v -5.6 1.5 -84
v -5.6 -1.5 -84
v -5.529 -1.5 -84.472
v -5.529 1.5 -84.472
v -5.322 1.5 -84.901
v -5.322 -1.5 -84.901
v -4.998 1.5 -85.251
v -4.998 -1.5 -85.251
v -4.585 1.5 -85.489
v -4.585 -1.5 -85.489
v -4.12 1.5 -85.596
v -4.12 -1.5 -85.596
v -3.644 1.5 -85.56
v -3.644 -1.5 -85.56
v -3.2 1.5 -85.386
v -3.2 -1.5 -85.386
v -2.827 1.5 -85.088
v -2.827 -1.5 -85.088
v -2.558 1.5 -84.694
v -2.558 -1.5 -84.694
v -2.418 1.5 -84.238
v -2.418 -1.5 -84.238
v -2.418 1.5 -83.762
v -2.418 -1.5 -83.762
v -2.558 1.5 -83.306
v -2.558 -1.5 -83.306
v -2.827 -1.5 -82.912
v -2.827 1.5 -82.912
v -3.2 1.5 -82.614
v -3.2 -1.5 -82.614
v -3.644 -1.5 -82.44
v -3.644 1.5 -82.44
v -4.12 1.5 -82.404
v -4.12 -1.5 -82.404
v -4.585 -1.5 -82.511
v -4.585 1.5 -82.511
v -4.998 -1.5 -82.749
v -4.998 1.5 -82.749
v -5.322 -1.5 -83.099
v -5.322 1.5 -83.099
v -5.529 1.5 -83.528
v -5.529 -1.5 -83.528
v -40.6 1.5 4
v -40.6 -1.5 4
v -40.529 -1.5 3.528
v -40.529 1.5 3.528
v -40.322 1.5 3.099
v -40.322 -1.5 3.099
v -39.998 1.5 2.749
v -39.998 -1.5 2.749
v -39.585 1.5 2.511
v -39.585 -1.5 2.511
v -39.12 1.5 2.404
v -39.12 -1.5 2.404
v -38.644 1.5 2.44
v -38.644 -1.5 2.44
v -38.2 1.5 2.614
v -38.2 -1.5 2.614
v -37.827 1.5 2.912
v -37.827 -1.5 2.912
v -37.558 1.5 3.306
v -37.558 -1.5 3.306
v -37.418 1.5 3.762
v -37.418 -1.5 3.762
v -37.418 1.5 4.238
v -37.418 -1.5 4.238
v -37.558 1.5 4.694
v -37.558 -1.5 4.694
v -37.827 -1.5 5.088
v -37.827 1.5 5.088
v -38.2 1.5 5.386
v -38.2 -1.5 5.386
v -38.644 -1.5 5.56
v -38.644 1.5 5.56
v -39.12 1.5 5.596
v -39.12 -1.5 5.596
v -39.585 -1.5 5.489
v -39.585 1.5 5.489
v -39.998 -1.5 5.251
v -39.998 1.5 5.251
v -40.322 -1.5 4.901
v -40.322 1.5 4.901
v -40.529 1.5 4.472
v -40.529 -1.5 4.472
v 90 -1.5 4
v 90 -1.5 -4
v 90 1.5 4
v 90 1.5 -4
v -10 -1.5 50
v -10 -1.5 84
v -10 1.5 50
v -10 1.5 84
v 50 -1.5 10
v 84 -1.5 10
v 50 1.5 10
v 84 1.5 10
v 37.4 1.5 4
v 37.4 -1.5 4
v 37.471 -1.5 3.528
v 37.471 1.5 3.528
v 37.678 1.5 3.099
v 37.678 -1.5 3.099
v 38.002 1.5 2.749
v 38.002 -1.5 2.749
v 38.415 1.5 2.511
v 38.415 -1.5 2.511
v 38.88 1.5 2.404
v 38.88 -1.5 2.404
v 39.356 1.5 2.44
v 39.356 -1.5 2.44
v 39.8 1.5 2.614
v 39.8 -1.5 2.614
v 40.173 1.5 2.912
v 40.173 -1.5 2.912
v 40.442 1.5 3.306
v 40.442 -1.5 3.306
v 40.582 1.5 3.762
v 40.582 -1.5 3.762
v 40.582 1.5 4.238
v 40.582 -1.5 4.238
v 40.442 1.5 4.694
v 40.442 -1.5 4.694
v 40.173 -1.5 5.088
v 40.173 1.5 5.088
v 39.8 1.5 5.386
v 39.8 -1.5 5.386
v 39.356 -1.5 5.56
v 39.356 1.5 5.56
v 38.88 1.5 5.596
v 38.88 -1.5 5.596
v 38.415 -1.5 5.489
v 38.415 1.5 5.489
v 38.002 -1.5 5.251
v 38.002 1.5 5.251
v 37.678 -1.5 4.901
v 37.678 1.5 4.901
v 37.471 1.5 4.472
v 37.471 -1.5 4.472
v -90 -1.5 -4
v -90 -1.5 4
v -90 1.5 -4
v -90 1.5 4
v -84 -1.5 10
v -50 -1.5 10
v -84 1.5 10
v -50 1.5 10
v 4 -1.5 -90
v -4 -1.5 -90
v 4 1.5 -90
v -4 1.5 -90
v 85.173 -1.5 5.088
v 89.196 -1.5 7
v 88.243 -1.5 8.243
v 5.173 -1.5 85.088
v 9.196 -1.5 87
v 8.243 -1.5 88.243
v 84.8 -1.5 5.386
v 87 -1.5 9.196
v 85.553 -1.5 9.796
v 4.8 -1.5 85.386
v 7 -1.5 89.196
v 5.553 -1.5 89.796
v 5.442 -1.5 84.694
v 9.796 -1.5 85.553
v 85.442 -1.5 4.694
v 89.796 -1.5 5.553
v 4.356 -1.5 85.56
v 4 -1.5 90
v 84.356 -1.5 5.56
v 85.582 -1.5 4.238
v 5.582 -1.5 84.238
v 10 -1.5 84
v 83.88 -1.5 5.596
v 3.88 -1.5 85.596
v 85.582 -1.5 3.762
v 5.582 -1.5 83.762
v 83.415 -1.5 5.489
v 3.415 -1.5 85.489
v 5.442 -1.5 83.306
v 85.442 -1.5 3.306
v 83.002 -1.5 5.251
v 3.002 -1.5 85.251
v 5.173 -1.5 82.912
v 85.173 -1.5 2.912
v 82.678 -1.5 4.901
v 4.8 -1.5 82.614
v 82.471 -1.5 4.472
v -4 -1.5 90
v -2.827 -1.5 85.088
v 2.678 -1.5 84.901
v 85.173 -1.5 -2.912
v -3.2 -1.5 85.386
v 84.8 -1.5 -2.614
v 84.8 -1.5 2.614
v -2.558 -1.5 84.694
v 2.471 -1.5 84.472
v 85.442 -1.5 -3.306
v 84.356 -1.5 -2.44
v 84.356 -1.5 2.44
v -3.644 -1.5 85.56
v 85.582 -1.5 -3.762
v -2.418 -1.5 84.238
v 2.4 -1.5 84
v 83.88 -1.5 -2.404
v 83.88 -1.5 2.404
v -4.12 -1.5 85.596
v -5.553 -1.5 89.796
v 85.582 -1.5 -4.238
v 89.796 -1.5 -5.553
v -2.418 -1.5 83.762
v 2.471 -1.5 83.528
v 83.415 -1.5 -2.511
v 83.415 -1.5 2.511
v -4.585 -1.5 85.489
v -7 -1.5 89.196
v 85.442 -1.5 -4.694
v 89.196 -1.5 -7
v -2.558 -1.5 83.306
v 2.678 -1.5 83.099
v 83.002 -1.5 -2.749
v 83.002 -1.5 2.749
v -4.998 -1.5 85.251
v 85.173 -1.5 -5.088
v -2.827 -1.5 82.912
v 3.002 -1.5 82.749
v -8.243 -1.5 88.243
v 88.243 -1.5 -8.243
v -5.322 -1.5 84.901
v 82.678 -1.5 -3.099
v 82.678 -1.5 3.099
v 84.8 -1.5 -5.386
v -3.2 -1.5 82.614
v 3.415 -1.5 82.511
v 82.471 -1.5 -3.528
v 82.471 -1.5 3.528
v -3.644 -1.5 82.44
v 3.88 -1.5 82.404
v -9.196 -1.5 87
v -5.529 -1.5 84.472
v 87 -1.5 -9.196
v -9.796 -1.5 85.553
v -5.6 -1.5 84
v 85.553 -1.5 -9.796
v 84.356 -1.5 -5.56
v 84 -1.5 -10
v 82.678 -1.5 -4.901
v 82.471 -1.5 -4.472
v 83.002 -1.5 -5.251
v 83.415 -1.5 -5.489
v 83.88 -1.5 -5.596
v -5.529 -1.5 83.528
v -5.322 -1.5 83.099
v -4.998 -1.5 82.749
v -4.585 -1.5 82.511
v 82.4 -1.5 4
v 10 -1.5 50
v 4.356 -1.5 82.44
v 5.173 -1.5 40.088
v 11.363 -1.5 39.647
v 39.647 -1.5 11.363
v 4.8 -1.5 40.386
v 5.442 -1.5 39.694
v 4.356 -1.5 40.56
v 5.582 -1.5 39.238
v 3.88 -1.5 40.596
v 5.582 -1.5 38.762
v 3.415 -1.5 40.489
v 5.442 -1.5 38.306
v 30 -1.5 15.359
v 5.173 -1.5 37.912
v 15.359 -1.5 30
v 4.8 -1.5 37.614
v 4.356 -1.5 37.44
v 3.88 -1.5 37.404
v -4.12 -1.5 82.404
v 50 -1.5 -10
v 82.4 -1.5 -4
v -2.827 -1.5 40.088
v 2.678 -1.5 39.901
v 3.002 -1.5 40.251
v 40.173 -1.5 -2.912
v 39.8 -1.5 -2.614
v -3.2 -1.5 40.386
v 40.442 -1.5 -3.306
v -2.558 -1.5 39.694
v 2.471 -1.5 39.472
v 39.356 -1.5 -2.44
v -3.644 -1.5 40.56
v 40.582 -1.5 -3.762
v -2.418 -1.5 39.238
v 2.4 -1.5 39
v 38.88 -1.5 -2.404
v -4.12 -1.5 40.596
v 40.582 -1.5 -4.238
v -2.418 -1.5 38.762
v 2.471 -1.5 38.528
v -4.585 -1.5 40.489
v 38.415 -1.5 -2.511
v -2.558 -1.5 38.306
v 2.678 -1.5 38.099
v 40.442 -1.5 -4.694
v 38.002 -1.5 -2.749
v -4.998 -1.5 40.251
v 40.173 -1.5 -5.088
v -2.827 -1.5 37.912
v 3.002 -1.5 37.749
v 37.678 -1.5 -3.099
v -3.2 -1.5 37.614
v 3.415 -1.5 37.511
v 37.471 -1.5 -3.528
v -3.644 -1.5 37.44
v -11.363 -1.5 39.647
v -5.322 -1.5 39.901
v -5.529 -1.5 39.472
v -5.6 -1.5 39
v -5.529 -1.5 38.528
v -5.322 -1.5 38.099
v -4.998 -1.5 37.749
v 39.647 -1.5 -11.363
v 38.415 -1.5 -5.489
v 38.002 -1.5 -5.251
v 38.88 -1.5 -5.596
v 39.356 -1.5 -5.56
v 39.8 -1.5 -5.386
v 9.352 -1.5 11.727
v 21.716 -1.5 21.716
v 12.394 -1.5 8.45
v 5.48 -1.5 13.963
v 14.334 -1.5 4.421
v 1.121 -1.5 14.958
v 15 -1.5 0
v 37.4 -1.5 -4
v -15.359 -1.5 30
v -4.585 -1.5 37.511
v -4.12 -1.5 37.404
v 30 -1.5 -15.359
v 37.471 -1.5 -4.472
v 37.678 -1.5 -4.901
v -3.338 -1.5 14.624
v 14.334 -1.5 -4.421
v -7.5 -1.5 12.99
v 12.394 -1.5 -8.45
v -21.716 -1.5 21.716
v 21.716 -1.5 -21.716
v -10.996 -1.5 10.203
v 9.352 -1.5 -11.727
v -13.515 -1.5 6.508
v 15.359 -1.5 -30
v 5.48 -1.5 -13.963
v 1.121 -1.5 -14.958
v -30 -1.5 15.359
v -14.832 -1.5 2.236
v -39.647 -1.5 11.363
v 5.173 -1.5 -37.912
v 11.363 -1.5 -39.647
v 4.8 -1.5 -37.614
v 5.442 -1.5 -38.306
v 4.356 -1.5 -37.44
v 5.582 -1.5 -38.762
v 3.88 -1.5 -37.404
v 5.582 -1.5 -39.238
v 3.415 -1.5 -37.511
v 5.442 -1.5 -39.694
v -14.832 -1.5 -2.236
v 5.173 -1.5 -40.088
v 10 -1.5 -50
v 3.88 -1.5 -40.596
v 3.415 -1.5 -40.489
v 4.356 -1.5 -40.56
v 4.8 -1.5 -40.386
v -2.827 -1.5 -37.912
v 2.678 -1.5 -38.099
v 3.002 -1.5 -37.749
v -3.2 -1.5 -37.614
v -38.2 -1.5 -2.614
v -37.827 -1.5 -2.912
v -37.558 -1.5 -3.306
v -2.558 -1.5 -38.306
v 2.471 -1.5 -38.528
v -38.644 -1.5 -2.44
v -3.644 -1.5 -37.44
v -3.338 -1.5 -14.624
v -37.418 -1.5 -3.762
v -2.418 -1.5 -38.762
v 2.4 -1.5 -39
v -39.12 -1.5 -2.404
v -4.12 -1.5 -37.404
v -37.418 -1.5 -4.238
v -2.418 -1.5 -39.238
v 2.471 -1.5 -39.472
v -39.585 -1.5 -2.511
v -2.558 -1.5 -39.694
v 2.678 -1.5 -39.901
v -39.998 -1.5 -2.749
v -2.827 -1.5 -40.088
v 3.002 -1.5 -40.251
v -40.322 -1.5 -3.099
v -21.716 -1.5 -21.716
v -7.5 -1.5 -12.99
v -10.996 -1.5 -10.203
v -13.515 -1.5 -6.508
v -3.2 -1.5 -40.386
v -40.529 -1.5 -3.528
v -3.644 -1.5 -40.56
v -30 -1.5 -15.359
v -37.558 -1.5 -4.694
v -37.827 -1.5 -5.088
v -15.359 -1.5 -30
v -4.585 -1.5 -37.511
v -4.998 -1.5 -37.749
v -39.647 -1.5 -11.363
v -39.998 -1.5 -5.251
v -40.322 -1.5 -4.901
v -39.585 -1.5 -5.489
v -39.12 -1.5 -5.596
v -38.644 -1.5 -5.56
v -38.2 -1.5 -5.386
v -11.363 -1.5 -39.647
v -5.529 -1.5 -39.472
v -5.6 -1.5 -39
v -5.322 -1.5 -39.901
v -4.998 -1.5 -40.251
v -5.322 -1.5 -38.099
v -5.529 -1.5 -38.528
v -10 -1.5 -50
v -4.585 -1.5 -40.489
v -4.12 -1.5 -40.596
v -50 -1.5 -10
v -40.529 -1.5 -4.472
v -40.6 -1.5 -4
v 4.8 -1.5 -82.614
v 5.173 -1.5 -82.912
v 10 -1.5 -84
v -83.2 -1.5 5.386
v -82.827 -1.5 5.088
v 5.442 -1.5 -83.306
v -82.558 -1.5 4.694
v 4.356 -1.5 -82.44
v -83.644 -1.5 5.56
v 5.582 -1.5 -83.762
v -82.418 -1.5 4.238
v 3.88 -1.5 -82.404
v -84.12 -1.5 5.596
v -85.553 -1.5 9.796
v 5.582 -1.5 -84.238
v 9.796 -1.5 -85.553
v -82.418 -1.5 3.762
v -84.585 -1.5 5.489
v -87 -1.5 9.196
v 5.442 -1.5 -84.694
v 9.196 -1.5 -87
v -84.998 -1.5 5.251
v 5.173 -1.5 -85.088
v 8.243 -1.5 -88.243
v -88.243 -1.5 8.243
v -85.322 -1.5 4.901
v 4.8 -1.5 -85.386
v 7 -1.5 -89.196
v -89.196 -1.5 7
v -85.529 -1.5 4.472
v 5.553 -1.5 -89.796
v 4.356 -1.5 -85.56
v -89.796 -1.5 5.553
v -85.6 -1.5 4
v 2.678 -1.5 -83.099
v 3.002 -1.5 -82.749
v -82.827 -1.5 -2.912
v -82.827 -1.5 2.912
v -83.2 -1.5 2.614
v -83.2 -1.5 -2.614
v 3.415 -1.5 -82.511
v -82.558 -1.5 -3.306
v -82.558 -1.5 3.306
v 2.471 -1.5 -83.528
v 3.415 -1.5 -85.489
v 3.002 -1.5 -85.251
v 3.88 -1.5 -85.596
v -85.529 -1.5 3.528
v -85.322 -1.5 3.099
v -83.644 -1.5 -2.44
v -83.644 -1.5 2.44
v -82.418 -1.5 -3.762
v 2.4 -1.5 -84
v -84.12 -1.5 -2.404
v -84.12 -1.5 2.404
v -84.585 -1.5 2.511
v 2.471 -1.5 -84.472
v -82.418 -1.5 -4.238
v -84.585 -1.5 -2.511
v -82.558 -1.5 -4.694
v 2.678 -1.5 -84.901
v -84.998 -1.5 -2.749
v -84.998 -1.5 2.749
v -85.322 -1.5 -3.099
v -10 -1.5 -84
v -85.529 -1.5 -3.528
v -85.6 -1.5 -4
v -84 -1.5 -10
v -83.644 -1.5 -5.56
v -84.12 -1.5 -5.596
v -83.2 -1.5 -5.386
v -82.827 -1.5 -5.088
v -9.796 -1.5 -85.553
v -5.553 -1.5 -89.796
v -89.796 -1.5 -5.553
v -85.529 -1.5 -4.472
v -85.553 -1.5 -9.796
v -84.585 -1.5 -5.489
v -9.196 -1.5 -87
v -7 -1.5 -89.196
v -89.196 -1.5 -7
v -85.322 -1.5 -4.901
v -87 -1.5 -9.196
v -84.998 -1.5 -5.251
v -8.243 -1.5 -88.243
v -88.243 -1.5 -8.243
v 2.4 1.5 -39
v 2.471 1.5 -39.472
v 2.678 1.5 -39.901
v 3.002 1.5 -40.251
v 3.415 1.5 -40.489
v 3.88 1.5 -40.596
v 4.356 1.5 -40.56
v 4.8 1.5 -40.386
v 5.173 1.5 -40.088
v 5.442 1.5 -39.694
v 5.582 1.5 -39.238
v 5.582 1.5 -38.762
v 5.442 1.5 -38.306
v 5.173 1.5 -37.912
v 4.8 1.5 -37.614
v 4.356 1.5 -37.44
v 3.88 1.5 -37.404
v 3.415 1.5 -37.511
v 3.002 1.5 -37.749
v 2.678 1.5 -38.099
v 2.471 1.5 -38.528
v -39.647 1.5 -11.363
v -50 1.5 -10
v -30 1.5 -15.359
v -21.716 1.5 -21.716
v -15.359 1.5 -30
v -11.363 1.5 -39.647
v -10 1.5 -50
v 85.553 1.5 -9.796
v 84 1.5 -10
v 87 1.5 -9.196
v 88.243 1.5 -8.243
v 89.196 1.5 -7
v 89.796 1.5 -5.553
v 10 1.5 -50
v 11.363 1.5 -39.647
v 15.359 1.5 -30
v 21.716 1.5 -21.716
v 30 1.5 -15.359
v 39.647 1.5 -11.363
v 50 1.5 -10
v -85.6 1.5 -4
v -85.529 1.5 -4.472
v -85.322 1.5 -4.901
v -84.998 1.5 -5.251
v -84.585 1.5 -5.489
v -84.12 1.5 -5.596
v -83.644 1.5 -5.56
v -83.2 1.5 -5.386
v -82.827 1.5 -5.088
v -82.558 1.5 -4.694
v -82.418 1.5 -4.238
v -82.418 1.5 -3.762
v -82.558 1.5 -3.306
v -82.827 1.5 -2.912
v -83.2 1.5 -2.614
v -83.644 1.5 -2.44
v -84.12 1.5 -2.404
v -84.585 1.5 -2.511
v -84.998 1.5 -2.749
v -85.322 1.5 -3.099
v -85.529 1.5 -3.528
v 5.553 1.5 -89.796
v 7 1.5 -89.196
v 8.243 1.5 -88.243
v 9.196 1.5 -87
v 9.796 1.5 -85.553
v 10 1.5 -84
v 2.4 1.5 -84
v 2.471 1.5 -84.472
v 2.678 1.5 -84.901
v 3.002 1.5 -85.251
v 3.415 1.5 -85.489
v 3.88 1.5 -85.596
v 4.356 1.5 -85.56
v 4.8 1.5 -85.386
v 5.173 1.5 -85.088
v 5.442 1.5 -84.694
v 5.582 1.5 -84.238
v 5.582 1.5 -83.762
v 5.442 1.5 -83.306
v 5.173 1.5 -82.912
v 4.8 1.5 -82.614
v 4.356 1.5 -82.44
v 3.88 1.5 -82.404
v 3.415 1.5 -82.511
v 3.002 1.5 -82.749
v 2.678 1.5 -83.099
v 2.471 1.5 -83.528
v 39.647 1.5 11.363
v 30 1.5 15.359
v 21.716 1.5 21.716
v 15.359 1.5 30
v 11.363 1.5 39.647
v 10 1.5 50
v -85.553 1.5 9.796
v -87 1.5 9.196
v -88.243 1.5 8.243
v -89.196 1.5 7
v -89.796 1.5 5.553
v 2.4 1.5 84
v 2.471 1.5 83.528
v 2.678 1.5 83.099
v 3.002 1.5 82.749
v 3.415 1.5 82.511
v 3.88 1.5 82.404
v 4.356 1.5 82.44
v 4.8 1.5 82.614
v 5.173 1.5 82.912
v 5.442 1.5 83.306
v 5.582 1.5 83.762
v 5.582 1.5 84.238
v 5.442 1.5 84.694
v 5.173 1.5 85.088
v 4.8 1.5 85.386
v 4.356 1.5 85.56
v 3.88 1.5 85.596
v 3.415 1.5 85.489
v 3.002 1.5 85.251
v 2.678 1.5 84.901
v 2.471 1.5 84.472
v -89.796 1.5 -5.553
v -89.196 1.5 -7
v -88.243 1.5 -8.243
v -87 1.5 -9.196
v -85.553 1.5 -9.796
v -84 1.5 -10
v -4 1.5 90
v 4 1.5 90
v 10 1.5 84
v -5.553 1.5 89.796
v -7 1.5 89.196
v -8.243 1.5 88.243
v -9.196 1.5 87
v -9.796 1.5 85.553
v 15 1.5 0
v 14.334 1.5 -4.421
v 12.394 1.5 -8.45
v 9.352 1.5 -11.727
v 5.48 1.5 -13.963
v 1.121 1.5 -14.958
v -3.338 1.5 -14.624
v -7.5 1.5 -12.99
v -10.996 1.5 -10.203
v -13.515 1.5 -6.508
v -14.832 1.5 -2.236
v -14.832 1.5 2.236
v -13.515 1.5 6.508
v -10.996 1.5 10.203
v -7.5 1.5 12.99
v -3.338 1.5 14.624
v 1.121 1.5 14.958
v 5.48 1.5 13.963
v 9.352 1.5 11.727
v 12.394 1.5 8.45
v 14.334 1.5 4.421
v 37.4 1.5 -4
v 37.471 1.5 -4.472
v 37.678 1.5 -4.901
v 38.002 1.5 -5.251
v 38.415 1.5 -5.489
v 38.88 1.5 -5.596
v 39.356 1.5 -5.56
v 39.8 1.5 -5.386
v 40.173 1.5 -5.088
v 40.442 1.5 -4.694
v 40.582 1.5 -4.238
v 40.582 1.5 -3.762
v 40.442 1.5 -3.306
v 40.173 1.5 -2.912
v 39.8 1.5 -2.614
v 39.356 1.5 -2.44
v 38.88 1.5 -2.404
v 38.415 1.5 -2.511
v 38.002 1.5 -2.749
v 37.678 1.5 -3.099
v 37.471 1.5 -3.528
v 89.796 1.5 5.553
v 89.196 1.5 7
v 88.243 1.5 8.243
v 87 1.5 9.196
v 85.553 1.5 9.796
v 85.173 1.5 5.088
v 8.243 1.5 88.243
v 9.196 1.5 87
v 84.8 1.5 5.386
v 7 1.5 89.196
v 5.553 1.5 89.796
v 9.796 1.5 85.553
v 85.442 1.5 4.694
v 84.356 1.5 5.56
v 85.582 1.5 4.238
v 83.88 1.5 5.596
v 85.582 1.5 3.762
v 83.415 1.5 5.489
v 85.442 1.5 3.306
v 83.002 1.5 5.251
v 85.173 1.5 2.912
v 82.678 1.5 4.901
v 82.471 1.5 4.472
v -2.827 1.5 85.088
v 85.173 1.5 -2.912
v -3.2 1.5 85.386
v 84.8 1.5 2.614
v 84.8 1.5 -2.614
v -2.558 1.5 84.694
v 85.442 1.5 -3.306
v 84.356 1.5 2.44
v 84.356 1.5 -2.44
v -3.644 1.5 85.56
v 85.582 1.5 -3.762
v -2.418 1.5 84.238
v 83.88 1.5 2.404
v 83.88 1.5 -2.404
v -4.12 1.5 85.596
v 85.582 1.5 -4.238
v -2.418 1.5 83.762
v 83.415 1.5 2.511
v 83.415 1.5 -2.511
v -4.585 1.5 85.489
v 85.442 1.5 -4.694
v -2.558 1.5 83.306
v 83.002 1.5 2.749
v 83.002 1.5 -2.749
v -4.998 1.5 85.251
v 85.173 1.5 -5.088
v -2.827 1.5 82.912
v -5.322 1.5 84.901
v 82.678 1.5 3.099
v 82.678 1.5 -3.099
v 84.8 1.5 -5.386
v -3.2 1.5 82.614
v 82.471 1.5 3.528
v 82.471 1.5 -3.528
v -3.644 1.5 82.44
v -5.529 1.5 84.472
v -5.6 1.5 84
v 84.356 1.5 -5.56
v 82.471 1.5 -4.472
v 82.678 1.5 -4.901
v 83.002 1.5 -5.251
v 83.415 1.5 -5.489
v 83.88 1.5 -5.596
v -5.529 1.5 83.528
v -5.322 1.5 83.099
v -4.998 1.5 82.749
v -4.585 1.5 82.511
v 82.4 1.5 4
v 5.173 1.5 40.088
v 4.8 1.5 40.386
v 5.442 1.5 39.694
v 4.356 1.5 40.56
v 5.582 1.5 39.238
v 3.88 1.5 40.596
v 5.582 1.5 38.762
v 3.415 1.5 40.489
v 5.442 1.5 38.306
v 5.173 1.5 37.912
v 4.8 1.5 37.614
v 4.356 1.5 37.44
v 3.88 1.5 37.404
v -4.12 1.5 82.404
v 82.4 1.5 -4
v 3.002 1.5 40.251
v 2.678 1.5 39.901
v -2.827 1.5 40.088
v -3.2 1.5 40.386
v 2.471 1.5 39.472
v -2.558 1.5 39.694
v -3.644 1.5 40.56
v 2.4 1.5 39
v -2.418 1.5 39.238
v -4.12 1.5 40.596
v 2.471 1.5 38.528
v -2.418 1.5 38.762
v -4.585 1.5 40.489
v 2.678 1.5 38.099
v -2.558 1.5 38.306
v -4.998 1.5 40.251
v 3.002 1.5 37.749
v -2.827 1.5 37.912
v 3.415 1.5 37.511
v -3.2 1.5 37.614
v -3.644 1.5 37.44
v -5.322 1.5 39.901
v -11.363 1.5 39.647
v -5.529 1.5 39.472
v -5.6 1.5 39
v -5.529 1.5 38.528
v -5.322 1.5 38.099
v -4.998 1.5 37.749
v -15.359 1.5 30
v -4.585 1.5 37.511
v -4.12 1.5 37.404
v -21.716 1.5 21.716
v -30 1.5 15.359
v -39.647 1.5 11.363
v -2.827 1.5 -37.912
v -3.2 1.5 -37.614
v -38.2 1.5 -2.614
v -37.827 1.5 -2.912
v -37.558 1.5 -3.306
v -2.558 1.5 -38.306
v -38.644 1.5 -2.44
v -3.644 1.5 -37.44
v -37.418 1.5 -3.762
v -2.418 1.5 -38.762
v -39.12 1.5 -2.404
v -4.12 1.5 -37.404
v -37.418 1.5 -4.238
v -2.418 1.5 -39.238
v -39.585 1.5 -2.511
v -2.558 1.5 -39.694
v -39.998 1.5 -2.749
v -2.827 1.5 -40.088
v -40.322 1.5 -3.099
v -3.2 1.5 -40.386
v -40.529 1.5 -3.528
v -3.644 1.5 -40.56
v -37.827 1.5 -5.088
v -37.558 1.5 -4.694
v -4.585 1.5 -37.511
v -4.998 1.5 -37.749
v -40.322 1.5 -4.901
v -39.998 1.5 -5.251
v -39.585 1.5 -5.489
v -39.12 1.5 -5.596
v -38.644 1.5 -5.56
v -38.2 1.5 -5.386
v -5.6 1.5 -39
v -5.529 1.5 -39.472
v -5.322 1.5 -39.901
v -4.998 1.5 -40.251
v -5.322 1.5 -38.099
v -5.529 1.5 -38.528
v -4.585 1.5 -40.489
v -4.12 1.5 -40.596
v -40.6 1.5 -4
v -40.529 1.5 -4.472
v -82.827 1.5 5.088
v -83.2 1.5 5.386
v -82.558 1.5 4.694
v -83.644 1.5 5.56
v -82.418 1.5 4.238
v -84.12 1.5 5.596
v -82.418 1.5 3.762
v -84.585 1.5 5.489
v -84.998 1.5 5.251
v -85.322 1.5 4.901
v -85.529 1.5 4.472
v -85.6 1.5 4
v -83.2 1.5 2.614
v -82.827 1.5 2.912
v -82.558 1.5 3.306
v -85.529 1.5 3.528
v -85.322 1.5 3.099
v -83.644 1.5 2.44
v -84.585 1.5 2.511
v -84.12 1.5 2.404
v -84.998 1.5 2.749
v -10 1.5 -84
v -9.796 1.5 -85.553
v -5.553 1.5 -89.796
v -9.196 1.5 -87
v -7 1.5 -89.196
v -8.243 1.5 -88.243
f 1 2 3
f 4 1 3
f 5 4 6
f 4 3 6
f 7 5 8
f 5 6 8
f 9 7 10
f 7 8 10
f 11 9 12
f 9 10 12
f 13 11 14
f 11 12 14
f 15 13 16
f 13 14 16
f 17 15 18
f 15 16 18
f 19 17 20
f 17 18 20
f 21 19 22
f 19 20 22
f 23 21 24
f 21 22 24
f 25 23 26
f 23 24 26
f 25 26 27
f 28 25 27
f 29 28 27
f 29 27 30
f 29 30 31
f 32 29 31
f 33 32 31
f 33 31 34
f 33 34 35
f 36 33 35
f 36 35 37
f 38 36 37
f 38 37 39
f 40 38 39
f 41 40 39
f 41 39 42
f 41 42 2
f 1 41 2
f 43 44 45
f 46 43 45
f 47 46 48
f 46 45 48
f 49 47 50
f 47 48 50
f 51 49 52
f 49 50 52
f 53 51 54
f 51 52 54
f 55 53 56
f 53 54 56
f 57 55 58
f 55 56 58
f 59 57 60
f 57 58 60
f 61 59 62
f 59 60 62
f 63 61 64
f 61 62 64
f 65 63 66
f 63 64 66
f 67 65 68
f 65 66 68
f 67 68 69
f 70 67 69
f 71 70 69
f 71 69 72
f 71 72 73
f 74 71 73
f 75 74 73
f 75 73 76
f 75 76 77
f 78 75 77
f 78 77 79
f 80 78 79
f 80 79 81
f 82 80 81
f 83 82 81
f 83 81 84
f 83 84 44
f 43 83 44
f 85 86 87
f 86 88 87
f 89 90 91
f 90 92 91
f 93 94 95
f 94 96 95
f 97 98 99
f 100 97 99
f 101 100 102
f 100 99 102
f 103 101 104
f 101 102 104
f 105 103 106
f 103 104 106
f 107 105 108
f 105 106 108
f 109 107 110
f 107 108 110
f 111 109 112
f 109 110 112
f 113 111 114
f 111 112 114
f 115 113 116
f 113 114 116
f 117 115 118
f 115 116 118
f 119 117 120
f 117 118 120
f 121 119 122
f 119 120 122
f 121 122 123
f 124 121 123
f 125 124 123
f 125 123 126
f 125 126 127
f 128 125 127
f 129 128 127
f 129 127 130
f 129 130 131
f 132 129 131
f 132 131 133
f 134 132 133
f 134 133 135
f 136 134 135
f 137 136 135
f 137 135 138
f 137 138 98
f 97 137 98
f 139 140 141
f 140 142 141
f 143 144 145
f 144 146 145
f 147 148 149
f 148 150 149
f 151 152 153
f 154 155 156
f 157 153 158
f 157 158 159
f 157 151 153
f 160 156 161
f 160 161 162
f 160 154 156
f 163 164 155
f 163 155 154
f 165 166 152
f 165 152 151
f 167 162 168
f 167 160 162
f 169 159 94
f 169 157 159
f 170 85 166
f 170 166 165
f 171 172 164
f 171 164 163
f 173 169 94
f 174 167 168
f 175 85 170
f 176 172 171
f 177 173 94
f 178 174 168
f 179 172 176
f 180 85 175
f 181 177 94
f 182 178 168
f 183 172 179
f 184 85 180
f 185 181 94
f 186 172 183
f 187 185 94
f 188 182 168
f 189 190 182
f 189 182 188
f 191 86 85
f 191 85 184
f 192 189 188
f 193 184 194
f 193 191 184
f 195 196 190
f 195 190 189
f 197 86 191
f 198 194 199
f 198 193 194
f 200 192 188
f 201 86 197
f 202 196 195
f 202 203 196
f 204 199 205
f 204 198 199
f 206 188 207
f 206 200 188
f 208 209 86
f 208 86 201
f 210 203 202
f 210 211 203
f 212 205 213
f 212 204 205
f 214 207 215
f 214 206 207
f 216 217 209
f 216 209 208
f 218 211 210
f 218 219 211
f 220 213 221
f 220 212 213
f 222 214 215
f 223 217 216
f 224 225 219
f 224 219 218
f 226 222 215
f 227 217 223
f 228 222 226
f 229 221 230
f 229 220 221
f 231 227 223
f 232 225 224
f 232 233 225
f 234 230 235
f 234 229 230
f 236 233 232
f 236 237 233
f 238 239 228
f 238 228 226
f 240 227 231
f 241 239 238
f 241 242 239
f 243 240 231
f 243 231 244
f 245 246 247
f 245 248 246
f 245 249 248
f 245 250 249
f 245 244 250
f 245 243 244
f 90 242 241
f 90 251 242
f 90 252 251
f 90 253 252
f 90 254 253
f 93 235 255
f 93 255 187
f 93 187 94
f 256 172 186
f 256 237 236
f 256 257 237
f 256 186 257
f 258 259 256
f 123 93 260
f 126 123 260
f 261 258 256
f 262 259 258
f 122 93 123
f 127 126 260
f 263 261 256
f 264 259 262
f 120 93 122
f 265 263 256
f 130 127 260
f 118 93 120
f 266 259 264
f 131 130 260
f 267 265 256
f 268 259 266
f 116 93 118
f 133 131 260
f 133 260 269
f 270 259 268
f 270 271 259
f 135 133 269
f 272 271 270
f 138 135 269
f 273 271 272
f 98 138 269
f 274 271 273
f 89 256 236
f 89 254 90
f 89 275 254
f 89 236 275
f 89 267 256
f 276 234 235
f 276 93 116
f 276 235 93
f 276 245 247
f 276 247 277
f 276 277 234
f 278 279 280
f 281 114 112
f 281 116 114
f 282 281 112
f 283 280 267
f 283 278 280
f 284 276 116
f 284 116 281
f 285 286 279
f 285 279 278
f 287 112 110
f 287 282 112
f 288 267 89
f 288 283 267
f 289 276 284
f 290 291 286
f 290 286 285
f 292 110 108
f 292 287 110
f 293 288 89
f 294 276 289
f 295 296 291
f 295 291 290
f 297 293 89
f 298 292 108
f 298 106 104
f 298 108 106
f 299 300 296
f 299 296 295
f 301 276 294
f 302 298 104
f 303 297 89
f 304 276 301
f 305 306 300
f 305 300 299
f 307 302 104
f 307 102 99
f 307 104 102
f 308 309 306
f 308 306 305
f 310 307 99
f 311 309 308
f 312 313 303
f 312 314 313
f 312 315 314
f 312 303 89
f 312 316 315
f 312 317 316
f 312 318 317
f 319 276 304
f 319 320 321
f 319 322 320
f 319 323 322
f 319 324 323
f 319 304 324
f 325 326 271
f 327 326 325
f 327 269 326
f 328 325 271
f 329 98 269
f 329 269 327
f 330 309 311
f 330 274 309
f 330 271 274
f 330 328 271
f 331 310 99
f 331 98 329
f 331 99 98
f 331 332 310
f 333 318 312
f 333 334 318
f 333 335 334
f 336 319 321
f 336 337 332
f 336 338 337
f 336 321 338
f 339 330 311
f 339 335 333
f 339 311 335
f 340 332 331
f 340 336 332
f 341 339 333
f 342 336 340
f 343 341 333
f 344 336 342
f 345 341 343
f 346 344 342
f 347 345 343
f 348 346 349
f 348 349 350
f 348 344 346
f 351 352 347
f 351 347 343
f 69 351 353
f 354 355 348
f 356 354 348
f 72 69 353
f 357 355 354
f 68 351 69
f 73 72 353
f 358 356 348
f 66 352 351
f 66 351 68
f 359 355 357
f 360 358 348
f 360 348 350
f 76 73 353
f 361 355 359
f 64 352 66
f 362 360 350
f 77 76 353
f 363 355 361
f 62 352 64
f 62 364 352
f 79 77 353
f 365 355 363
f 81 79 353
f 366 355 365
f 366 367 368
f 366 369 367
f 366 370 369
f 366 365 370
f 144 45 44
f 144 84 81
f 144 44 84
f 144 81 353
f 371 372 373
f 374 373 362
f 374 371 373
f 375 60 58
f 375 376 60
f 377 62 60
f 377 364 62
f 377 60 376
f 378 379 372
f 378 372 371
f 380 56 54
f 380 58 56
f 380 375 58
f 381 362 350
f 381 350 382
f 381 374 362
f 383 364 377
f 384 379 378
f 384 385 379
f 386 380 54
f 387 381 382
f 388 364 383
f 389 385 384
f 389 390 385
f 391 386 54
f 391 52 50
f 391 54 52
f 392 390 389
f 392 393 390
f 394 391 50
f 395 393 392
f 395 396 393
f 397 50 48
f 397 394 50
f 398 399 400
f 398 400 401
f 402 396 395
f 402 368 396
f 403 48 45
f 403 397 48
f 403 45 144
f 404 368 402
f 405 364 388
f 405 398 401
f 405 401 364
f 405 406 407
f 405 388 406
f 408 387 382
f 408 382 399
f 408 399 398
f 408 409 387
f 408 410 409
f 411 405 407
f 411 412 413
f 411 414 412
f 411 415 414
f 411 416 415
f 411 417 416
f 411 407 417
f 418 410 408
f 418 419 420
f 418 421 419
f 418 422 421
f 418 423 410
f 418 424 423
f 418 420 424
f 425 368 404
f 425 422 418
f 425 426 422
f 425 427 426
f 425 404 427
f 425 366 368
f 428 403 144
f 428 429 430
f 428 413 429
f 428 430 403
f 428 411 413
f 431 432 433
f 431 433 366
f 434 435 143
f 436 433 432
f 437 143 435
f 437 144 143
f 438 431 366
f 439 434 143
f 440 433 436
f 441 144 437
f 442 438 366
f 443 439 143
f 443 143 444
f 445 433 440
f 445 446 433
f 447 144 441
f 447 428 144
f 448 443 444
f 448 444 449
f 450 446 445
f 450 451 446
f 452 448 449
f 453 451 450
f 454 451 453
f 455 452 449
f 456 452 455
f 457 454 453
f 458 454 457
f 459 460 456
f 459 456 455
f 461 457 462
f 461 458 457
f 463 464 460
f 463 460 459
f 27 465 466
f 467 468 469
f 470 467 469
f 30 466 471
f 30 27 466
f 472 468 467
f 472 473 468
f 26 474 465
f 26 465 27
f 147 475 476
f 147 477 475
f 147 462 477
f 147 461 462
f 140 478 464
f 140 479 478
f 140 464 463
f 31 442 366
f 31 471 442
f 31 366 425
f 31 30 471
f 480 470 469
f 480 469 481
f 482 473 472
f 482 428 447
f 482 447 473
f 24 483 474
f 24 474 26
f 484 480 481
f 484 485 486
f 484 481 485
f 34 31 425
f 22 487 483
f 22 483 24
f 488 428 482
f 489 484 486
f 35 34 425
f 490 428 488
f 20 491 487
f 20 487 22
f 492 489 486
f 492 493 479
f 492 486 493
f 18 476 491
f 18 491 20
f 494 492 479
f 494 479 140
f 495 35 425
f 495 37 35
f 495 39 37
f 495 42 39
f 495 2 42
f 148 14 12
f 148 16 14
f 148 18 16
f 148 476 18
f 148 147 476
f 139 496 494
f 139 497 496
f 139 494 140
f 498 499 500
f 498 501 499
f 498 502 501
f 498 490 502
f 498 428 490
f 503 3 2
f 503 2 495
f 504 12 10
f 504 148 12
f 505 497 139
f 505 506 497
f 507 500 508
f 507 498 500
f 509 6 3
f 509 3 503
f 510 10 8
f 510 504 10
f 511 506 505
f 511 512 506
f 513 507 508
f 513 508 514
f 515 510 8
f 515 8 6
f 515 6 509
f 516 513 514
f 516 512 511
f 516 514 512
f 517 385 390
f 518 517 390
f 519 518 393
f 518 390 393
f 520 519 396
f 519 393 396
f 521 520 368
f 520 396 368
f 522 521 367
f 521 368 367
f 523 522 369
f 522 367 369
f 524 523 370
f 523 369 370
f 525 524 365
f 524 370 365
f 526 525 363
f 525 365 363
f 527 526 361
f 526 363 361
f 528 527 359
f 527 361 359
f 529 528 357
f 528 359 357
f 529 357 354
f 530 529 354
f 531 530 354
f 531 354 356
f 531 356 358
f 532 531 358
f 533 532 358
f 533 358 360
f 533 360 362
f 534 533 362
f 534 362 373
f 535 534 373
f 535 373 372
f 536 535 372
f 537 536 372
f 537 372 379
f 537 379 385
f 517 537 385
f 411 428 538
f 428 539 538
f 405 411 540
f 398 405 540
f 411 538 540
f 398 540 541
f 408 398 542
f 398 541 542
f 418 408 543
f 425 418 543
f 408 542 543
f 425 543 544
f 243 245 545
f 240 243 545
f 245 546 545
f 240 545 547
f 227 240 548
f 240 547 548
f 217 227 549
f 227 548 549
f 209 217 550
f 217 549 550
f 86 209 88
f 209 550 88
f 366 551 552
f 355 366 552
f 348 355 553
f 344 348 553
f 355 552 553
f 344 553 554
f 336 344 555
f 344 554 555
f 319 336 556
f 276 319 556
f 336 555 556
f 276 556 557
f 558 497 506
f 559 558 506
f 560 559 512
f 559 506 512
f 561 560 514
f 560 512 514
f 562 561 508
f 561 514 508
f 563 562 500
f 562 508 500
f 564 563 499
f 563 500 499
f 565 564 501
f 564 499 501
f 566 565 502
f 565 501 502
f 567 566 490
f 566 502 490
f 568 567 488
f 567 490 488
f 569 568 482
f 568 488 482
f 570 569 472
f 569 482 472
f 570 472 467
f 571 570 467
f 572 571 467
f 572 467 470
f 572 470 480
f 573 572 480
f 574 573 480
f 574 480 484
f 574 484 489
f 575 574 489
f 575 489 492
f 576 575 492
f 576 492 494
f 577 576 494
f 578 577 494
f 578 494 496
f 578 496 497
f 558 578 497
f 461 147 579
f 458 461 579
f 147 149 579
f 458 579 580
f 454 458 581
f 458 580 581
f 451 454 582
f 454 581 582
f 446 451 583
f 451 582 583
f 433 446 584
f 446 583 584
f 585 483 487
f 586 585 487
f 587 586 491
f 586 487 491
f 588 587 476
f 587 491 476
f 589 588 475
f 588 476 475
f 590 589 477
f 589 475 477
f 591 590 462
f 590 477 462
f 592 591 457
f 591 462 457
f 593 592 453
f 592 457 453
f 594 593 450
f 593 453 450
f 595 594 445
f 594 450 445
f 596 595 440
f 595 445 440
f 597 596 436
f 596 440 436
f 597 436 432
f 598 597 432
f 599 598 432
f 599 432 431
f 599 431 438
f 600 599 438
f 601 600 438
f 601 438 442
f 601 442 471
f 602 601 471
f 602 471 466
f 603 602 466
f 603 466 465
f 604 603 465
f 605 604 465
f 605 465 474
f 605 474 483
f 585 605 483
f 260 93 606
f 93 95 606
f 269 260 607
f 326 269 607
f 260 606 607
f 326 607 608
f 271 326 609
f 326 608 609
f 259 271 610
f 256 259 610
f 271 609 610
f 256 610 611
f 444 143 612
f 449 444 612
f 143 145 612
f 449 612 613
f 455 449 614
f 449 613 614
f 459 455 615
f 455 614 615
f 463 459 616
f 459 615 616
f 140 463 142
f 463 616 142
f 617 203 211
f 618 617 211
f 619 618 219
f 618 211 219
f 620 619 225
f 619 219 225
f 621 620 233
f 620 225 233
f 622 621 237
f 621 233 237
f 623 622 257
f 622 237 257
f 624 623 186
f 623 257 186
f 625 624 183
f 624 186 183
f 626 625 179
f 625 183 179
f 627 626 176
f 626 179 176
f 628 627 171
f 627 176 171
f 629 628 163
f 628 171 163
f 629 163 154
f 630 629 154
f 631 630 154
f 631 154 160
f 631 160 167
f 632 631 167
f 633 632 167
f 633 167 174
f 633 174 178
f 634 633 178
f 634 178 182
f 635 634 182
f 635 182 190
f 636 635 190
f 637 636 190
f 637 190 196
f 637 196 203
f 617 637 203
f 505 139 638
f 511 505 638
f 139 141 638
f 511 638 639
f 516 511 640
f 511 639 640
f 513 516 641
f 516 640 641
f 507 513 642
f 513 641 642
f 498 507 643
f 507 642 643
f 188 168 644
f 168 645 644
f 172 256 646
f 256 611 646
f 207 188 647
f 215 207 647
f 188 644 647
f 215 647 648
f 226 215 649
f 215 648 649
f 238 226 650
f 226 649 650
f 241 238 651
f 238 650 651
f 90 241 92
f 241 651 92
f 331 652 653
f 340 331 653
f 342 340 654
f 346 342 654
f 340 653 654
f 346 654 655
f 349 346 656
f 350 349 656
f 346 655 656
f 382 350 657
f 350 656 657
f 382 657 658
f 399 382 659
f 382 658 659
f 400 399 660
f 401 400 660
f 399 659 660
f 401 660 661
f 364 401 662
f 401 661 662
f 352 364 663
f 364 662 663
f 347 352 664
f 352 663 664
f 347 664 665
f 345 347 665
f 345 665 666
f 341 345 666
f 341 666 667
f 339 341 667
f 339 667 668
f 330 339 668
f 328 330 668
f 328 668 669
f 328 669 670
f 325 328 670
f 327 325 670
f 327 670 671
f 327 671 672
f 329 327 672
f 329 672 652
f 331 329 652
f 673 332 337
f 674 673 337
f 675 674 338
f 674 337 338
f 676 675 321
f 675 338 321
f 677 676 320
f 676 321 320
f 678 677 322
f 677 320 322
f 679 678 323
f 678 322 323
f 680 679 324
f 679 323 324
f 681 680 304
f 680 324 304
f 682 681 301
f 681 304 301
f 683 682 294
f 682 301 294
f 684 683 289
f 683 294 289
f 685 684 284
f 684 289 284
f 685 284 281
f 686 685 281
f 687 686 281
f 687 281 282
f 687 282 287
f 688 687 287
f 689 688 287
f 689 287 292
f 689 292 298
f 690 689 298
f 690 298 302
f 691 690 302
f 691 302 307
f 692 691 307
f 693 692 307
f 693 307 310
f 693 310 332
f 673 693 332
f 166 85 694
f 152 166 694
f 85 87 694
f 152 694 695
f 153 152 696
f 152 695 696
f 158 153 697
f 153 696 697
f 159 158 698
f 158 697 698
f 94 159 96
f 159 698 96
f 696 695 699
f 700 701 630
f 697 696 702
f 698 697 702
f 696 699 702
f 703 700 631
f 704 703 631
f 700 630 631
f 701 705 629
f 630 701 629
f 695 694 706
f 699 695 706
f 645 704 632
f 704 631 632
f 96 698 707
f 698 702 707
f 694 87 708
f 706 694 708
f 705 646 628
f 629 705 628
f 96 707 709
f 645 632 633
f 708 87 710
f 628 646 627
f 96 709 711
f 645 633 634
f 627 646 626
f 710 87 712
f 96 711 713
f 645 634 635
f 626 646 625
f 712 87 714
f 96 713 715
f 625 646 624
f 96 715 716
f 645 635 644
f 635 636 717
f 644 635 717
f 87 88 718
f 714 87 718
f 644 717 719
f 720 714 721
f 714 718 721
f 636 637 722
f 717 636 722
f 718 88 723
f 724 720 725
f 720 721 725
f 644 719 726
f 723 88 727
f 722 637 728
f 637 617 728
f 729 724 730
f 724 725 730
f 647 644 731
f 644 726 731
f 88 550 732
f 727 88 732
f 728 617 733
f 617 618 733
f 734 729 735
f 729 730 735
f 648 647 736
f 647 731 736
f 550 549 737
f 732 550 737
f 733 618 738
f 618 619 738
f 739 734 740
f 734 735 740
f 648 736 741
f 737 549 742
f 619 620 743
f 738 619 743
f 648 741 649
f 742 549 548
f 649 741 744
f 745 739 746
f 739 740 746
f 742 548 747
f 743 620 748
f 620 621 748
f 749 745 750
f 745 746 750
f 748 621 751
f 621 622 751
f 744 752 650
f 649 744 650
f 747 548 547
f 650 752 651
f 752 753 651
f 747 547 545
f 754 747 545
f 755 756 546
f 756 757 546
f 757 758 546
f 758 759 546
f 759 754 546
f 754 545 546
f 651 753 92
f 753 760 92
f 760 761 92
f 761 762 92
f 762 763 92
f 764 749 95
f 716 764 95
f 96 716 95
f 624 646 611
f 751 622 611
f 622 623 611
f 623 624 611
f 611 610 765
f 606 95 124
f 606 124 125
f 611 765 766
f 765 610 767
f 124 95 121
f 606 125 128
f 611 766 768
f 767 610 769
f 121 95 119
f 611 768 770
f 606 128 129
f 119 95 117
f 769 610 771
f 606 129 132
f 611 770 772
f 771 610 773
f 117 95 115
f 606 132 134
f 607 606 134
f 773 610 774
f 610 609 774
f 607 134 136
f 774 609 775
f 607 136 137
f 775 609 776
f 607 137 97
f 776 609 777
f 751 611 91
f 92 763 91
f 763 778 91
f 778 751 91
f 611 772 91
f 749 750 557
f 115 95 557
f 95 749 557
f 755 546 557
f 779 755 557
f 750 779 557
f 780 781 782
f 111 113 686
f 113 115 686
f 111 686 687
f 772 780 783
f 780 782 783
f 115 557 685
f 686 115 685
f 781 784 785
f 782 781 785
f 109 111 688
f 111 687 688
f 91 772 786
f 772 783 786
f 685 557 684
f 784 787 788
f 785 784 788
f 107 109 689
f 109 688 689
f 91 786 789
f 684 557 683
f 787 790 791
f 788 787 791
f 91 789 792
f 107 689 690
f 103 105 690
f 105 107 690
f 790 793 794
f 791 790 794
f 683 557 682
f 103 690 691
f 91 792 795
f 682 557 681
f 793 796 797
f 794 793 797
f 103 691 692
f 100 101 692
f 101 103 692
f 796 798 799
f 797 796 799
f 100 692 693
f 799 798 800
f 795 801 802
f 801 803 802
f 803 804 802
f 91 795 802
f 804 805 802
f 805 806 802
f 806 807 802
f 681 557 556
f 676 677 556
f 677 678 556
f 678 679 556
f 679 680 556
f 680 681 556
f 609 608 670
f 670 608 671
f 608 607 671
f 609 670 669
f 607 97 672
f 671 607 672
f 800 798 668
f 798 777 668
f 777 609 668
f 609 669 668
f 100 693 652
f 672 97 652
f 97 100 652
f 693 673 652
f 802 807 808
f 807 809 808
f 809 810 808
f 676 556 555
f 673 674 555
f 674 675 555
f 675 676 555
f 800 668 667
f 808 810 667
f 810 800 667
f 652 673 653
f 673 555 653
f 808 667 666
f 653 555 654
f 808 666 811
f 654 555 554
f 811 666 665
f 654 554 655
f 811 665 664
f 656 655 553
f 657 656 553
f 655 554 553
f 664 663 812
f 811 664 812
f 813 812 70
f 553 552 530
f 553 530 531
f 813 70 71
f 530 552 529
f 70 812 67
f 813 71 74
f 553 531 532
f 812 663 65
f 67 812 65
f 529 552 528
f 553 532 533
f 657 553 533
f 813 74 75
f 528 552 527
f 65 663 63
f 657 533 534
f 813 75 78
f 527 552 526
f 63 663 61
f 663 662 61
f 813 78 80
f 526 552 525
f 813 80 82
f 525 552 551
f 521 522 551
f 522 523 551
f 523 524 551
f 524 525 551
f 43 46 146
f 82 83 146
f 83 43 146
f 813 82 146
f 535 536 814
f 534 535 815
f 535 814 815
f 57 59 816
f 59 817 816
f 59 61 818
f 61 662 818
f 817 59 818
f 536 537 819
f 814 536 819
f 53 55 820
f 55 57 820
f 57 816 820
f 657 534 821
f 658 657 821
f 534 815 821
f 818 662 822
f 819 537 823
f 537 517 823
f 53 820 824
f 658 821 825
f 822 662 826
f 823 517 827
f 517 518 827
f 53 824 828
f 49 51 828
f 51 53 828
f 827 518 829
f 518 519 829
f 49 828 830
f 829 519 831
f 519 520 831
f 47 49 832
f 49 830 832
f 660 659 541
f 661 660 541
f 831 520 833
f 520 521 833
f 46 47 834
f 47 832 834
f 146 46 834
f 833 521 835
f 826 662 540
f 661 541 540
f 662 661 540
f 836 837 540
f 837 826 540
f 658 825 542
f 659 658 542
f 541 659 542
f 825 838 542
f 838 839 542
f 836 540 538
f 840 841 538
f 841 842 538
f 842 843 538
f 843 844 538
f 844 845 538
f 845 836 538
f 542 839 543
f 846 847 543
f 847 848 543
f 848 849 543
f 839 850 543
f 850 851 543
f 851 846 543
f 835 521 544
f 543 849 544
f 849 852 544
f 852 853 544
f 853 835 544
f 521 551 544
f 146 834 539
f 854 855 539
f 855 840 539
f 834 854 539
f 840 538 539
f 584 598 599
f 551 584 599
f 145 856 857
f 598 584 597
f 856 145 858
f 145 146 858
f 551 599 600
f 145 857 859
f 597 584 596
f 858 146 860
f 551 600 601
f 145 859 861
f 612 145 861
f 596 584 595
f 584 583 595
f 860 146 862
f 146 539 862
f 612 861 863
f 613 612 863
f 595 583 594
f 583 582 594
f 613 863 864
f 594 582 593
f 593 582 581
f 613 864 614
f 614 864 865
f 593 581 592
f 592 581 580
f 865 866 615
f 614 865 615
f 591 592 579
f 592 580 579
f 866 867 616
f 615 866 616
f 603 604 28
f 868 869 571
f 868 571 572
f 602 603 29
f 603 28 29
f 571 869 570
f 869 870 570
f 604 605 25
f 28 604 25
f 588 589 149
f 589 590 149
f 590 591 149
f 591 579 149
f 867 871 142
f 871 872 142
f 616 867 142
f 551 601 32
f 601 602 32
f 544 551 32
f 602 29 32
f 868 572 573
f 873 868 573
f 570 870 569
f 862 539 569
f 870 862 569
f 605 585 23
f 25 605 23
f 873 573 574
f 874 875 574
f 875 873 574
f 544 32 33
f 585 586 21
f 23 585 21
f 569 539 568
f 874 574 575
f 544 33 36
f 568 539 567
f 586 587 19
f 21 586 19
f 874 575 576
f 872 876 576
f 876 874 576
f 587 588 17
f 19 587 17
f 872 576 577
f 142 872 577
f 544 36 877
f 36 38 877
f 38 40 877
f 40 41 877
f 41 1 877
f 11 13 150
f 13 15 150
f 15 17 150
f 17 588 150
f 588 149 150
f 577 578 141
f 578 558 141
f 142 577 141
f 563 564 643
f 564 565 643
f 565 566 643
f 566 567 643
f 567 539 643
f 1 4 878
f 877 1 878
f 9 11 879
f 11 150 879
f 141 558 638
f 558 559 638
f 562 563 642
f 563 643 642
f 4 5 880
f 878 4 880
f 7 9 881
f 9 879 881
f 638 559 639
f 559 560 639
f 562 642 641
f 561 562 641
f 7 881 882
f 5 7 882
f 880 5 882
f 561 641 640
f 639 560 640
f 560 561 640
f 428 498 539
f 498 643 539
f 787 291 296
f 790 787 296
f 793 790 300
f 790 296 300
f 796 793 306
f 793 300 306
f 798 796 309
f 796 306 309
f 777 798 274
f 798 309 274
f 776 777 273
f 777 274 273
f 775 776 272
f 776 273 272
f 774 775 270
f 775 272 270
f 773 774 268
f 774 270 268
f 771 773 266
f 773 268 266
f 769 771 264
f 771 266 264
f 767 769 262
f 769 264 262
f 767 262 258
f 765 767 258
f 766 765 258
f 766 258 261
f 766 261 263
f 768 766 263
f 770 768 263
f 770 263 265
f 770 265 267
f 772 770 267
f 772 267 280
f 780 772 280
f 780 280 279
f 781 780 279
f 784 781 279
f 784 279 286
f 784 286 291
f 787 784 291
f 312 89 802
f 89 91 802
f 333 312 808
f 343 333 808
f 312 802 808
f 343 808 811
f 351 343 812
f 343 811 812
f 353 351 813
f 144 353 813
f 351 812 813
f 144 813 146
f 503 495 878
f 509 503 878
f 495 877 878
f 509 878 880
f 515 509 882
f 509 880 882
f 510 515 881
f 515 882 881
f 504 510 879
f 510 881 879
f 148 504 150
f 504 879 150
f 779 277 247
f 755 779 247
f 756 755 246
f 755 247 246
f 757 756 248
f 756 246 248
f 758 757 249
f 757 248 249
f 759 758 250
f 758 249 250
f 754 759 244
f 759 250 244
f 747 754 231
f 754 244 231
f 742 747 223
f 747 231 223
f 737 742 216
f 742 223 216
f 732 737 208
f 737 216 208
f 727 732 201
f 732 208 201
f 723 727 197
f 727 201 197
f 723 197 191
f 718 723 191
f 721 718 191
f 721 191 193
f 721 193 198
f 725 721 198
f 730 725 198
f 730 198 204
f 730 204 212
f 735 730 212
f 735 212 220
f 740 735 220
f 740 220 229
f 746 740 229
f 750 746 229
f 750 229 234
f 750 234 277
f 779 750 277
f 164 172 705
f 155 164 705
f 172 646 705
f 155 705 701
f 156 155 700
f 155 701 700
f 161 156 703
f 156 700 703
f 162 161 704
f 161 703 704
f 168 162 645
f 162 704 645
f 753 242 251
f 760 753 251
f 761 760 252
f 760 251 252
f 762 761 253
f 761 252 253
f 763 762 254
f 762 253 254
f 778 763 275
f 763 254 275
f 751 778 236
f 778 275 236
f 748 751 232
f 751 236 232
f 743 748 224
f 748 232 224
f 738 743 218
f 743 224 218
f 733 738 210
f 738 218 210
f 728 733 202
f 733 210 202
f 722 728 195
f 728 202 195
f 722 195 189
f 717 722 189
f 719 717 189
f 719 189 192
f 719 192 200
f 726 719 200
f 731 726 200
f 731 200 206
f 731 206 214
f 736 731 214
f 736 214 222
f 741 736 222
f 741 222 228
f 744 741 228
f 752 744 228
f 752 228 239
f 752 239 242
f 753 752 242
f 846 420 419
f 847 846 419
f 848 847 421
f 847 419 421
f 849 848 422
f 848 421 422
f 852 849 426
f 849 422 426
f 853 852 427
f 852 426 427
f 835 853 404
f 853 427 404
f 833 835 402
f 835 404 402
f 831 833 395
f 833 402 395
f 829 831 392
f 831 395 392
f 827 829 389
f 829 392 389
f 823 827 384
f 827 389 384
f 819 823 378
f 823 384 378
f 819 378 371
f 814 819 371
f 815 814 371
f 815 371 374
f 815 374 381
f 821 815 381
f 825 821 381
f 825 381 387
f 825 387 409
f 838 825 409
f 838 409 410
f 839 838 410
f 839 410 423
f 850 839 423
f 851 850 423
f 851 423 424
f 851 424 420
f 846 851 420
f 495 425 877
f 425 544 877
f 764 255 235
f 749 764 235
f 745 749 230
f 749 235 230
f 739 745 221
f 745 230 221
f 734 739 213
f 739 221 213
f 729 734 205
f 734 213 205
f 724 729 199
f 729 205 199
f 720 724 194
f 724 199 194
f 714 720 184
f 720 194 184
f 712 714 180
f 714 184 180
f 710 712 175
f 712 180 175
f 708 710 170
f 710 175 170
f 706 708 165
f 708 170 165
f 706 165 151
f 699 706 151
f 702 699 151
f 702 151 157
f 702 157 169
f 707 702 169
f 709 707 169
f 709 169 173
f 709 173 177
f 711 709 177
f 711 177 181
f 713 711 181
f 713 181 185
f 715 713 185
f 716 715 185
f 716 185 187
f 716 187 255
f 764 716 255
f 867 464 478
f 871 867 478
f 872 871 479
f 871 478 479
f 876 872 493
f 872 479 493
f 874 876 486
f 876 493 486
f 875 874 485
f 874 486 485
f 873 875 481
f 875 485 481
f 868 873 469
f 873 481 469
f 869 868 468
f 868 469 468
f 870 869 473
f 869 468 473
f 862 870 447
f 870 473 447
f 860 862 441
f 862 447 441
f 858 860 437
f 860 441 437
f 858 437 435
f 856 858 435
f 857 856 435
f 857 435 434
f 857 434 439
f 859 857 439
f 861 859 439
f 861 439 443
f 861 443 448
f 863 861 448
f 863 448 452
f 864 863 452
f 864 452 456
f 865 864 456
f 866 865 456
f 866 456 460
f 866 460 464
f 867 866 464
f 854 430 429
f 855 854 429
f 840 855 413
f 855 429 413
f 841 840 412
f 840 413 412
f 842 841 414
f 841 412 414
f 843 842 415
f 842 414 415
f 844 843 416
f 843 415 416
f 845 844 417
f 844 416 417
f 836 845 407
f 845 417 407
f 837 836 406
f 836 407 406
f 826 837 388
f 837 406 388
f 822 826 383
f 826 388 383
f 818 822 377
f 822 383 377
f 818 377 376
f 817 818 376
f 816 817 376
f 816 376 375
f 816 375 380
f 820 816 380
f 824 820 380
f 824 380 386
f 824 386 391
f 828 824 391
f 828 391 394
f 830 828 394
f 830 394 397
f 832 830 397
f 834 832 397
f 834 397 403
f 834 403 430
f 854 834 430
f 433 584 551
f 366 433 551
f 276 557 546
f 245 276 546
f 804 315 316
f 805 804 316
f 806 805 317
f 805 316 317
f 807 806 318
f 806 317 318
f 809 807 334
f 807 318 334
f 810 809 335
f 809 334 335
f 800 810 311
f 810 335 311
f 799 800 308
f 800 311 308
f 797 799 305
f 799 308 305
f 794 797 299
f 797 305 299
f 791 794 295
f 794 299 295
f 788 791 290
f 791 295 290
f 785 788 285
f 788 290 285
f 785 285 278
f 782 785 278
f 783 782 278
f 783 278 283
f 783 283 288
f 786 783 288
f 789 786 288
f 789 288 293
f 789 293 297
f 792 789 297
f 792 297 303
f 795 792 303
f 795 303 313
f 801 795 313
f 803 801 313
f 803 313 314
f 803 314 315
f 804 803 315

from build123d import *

# Parameters (mm, degrees)
BOSS_EXTRUDE1_DEPTH      = 1.5
M3_CLEARANCE_HOLE1_D     = 3.2
M3_CLEARANCE_HOLE1_DEPTH = 3
SKETCH5_R                = 15
CUT_EXTRUDE1_DEPTH       = 1
CUT_EXTRUDE1_DEPTH_BACK  = 4


with BuildPart() as part:
    # Sketch1 → Boss-Extrude1 (new body, symmetric)
    with BuildSketch(Plane(origin=(0, 0, 0), x_dir=(1, 0, 0), z_dir=(0, 1, 0))):
        with BuildLine():
            Line((50, 10), (84, 10))
            ThreePointArc((84, 10), (88.242640687, 8.242640687), (90, 4))
            Line((90, 4), (90, -4))
            ThreePointArc((90, -4), (88.242640687, -8.242640687), (84, -10))
            Line((84, -10), (50, -10))
            ThreePointArc((50, -10), (21.715728753, -21.715728753), (10, -50))
            Line((10, -50), (10, -84))
            ThreePointArc((10, -84), (8.242640687, -88.242640687), (4, -90))
            Line((4, -90), (-4, -90))
            ThreePointArc((-4, -90), (-8.242640687, -88.242640687), (-10, -84))
            Line((-10, -84), (-10, -50))
            ThreePointArc((-10, -50), (-21.715728753, -21.715728753), (-50, -10))
            Line((-50, -10), (-84, -10))
            ThreePointArc((-84, -10), (-88.242640687, -8.242640687), (-90, -4))
            Line((-90, -4), (-90, 4))
            ThreePointArc((-90, 4), (-88.242640687, 8.242640687), (-84, 10))
            Line((-84, 10), (-50, 10))
            ThreePointArc((-50, 10), (-21.715728753, 21.715728753), (-10, 50))
            Line((-10, 50), (-10, 84))
            ThreePointArc((-10, 84), (-8.242640687, 88.242640687), (-4, 90))
            Line((-4, 90), (4, 90))
            ThreePointArc((4, 90), (8.242640687, 88.242640687), (10, 84))
            Line((10, 84), (10, 50))
            ThreePointArc((10, 50), (21.715728753, 21.715728753), (50, 10))
        make_face()
    extrude(amount=BOSS_EXTRUDE1_DEPTH, both=True)

    # M3 Clearance Hole1
    with Locations(Plane(origin=(0, 1.5, 0), x_dir=(1, 0, 0), z_dir=(0, 1, 0))):
        with Locations((-84, 4), (-84, -4), (-4, 84), (4, 84), (84, 4), (84, -4), (4, -84), (-4, -84), (-39, 4), (-39, -4), (39, 4), (39, -4), (4, -39), (-4, -39), (-4, 39), (4, 39)):
            Hole(M3_CLEARANCE_HOLE1_D / 2, depth=M3_CLEARANCE_HOLE1_DEPTH)

    # Sketch5 → Cut-Extrude1 (cut, two sides)
    with BuildSketch(Plane(origin=(0, 1.5, 0), x_dir=(1, 0, 0), z_dir=(0, 1, 0))) as cut_extrude1_sk:
        Circle(SKETCH5_R)
    extrude(amount=CUT_EXTRUDE1_DEPTH, mode=Mode.SUBTRACT)
    extrude(cut_extrude1_sk.sketch, amount=-CUT_EXTRUDE1_DEPTH_BACK, mode=Mode.SUBTRACT)


solid = part.part
